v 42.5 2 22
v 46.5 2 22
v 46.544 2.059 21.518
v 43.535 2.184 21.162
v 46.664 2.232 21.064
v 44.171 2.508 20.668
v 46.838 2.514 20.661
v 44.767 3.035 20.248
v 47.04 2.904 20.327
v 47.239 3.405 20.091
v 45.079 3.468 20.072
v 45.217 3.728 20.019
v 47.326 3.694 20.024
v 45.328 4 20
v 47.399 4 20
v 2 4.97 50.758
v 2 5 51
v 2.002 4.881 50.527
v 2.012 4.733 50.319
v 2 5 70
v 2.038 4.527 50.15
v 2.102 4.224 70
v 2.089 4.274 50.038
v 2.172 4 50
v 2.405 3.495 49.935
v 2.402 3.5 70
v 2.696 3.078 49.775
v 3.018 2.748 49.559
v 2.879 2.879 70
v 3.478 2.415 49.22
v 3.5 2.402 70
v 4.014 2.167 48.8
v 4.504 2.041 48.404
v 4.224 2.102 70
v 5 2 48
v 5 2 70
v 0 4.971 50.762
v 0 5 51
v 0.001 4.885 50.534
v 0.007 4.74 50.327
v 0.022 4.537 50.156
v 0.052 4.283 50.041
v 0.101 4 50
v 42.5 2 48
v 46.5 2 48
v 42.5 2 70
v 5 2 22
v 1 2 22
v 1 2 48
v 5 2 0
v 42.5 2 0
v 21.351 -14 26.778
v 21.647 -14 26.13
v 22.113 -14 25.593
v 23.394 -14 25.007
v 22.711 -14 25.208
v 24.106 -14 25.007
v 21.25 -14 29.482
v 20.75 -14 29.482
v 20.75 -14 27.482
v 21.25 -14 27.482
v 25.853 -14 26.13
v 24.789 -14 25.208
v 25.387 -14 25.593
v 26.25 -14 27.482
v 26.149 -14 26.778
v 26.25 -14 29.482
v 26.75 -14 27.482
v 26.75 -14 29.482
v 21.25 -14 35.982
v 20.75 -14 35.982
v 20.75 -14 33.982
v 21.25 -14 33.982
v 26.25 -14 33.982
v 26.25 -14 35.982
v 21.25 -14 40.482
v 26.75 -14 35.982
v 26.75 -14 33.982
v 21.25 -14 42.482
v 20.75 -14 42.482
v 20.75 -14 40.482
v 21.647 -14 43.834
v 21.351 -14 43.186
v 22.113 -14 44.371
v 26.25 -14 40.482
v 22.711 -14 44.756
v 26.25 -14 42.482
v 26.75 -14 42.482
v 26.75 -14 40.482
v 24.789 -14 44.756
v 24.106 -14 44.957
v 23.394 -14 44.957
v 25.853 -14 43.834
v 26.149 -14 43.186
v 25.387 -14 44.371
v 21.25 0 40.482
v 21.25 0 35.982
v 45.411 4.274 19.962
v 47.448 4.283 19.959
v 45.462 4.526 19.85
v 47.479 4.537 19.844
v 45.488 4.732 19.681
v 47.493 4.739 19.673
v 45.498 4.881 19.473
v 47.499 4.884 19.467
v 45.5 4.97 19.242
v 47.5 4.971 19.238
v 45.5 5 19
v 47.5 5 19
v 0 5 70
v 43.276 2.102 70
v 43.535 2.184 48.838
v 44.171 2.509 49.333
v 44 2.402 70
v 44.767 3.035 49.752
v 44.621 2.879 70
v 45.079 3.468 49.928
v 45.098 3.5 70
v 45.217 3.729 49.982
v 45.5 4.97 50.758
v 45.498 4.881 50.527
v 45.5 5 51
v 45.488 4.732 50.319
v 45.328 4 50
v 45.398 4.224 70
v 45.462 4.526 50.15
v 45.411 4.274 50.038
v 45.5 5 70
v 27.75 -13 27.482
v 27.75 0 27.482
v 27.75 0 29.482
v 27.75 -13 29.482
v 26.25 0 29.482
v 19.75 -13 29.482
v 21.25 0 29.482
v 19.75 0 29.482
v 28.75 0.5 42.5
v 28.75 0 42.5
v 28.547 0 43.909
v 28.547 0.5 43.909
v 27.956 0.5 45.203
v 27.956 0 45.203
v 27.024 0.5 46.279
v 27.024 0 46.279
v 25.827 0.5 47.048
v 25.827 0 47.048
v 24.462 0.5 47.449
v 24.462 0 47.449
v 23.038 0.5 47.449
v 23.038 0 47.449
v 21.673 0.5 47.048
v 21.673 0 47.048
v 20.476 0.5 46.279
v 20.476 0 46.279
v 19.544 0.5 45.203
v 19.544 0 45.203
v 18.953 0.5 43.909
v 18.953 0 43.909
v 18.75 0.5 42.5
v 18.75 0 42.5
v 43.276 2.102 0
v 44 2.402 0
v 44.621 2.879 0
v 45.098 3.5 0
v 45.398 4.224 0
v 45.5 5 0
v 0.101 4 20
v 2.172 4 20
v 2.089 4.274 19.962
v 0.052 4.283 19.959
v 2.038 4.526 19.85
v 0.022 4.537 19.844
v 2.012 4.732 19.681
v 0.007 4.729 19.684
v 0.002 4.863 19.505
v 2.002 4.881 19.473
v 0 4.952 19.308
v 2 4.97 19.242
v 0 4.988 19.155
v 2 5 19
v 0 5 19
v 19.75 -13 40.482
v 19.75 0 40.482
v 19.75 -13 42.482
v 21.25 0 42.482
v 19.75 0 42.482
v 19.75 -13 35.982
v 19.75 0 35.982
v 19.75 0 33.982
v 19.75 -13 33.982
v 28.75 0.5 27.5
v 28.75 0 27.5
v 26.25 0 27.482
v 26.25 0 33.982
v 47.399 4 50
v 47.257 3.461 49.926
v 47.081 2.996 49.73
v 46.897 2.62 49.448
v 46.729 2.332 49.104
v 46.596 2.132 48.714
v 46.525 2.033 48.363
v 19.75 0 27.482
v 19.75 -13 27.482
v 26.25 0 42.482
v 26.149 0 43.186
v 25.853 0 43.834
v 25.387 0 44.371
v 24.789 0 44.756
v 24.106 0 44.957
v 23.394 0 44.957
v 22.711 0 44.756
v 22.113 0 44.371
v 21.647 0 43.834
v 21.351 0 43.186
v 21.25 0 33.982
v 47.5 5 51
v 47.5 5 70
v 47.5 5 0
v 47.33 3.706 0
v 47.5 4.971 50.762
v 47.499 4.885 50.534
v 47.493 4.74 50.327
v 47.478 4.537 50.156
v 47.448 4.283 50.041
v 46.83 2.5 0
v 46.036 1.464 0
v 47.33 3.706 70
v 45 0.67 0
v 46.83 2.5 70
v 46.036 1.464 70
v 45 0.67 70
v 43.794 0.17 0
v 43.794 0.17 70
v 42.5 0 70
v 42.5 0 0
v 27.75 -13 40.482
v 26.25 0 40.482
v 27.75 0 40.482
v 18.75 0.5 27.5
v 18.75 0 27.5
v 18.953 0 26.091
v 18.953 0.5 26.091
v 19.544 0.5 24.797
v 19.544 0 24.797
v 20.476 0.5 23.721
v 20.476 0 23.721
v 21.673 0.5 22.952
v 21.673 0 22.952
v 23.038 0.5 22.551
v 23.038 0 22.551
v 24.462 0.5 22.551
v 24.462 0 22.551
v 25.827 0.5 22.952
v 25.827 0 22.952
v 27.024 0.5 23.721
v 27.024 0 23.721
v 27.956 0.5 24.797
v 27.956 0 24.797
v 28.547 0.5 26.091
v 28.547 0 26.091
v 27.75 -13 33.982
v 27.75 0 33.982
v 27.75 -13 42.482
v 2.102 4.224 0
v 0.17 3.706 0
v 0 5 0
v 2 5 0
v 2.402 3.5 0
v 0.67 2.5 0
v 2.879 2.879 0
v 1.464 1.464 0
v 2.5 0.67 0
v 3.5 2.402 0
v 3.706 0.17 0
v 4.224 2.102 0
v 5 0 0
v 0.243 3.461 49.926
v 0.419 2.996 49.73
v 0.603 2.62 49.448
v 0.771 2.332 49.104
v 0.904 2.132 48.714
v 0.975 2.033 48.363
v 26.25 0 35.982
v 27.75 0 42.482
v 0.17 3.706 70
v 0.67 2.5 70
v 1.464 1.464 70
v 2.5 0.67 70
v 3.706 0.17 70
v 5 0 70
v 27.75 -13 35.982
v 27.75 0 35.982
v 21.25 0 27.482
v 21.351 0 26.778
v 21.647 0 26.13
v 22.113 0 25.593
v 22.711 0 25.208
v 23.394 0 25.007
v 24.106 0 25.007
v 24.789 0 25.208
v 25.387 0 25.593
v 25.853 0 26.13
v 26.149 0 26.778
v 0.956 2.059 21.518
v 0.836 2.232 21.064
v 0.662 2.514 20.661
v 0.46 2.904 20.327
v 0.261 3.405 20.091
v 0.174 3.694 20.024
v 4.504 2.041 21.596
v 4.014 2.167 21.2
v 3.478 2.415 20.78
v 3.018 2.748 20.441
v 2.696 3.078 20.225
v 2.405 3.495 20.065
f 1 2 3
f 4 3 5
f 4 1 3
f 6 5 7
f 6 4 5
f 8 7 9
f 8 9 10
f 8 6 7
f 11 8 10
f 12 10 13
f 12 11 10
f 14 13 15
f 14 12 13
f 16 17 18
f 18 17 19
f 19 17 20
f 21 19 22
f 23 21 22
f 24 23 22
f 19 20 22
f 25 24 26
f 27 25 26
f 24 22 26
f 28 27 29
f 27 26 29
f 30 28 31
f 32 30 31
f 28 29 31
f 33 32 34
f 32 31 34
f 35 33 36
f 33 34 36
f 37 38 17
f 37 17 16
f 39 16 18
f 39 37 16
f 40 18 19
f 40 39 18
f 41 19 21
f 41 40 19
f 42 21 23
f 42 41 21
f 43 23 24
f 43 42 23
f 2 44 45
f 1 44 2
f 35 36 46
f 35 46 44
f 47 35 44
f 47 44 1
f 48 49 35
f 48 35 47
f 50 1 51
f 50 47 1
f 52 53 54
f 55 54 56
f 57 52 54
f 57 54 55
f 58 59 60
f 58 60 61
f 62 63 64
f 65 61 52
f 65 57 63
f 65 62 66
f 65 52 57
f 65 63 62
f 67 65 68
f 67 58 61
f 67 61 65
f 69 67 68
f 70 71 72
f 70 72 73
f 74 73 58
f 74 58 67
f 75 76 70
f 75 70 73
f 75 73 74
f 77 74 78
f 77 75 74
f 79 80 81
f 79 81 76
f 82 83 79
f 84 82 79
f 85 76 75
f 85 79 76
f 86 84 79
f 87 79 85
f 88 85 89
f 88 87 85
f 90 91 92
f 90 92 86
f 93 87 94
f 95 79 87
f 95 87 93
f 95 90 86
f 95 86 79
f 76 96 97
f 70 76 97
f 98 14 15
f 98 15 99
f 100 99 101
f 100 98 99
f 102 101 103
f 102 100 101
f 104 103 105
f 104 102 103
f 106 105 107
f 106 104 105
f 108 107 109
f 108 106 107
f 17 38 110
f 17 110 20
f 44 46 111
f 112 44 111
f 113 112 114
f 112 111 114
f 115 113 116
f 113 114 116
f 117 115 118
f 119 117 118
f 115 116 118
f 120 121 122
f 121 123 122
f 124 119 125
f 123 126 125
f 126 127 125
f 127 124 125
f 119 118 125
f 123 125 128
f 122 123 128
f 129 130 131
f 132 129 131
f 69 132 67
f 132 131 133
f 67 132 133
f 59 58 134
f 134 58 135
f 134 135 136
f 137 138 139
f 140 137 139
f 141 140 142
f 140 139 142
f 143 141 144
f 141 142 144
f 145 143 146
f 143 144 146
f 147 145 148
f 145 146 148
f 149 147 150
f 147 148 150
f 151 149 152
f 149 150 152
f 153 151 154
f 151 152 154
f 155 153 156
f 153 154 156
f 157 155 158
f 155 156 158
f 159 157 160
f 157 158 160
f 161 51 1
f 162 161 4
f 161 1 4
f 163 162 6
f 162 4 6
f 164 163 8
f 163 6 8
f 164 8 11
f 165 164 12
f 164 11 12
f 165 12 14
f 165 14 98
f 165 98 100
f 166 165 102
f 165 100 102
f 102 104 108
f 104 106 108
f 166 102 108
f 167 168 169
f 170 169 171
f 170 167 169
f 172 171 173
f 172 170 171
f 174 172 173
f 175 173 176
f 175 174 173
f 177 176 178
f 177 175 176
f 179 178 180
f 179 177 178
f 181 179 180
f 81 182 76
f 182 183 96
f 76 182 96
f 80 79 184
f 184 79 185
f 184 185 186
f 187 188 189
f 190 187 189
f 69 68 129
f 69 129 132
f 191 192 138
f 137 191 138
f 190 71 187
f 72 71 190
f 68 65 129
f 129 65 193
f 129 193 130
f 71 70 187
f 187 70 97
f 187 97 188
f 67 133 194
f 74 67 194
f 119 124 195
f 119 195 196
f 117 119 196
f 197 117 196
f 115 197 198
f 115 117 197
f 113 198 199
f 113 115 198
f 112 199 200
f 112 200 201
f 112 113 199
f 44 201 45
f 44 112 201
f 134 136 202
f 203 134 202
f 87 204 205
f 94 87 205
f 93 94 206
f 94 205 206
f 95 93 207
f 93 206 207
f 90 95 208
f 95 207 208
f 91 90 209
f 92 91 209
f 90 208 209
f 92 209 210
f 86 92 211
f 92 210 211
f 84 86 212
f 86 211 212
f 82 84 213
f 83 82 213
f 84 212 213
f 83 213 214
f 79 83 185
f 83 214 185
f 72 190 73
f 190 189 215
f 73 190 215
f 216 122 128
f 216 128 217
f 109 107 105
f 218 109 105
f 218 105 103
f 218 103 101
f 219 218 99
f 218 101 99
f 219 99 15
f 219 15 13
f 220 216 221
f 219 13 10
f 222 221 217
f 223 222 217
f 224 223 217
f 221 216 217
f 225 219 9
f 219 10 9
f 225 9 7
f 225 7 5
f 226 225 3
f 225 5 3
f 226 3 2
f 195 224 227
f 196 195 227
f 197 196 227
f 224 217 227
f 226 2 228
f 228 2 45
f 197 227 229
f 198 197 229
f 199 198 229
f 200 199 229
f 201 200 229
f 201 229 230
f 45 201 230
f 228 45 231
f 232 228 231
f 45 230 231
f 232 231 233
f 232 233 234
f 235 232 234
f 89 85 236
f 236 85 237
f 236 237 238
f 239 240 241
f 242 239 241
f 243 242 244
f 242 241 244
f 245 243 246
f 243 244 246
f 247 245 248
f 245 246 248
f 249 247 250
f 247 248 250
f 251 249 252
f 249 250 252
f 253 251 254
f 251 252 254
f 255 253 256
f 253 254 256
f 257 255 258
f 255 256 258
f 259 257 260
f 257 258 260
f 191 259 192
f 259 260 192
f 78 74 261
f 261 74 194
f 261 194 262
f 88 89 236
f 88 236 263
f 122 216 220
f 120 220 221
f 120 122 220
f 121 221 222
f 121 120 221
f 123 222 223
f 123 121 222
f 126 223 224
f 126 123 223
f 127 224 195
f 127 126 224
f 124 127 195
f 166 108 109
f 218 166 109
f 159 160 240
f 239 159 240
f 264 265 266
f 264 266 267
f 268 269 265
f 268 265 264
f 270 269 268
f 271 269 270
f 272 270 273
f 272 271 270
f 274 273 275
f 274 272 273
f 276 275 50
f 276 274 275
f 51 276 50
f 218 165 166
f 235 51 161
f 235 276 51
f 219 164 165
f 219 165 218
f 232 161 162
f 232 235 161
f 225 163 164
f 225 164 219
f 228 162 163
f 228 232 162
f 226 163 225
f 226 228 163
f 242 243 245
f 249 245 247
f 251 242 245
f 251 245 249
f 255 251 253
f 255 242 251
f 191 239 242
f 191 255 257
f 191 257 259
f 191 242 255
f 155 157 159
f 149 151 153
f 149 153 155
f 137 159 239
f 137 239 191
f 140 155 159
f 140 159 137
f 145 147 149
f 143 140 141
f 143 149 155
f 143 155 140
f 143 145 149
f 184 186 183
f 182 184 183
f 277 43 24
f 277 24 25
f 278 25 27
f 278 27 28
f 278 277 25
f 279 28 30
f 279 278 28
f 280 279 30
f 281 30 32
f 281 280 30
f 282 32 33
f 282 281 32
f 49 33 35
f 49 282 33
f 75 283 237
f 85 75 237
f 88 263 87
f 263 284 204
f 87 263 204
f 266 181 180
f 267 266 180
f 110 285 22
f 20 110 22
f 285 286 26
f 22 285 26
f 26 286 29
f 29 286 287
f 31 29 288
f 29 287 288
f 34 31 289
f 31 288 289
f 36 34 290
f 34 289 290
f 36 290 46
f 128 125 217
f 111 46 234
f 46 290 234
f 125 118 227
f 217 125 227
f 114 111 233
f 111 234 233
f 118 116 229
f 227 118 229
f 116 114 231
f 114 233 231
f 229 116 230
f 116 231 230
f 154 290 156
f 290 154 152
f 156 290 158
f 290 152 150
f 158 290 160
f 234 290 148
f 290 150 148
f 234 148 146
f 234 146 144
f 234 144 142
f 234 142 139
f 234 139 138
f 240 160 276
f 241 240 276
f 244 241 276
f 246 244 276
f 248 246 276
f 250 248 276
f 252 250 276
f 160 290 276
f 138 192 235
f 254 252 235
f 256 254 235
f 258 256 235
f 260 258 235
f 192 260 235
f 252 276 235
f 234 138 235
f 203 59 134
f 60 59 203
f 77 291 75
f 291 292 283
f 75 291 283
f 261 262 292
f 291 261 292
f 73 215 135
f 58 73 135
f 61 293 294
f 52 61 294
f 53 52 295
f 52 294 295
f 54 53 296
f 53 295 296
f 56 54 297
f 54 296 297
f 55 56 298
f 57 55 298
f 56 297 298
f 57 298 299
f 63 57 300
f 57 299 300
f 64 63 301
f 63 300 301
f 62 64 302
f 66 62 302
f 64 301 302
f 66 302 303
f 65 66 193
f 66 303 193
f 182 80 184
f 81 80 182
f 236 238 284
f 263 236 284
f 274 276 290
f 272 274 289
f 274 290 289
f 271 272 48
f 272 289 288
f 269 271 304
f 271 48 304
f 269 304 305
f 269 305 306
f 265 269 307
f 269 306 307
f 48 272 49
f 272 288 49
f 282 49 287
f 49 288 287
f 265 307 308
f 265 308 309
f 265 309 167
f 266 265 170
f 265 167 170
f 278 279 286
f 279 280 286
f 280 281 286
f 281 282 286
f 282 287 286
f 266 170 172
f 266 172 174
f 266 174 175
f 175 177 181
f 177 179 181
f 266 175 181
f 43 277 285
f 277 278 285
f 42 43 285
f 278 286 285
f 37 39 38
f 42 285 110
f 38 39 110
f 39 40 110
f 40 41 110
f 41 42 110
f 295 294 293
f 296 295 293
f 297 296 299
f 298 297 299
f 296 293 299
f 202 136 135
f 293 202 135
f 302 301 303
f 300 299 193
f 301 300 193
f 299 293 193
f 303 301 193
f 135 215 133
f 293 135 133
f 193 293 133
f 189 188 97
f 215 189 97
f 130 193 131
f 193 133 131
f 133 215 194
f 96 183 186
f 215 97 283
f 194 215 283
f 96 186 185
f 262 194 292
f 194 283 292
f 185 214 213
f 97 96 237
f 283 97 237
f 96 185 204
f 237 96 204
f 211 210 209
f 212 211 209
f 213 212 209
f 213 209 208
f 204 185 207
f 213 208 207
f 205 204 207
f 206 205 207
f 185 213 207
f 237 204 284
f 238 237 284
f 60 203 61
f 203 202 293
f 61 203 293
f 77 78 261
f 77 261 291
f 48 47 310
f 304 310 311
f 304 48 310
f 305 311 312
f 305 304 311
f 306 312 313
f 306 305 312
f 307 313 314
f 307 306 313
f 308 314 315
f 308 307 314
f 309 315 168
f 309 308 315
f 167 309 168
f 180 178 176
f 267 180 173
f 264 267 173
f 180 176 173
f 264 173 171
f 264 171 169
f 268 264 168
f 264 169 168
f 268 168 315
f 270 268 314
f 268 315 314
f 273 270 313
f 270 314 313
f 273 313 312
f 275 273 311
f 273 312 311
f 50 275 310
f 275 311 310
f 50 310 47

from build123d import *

# Parameters (mm, degrees)
SKETCH2_W           = 47.5
SKETCH2_H           = 70
BOSS_EXTRUDE1_DEPTH = 5
CUT_EXTRUDE2_DEPTH  = 48.5
CUT_EXTRUDE1_DEPTH  = 71
CUT_EXTRUDE3_DEPTH  = 0.5
BOSS_EXTRUDE2_DEPTH = 14
CHAMFER1_SIZE       = 1


with BuildPart() as part:
    # Sketch2 → Boss-Extrude1 (new body)
    with BuildSketch(Plane(origin=(0, 0, 0), x_dir=(1, 0, 0), z_dir=(0, 1, 0))):
        with Locations((23.75, -35)):
            Rectangle(SKETCH2_W, SKETCH2_H)
    extrude(amount=BOSS_EXTRUDE1_DEPTH)

    # Sketch4 → Cut-Extrude2 (cut, through all)
    with BuildSketch(Plane.ZY):
        with BuildLine():
            Line((19, 5), (51, 5))
            ThreePointArc((51, 5), (50.292893219, 4.707106781), (50, 4))
            ThreePointArc((50, 4), (49.414213562, 2.585786438), (48, 2))
            Line((48, 2), (22, 2))
            ThreePointArc((22, 2), (20.585786438, 2.585786438), (20, 4))
            ThreePointArc((20, 4), (19.707106781, 4.707106781), (19, 5))
        make_face()
    extrude(amount=-CUT_EXTRUDE2_DEPTH, mode=Mode.SUBTRACT)

    # Sketch3 → Cut-Extrude1 (cut, through all)
    with BuildSketch(Plane.XY.offset(70)):
        with BuildLine():
            Line((5, 2), (42.5, 2))
            ThreePointArc((42.5, 2), (44.621320344, 2.878679656), (45.5, 5))
            Line((45.5, 5), (2, 5))
            ThreePointArc((2, 5), (2.878679656, 2.878679656), (5, 2))
        make_face()
        with BuildLine():
            Line((42.5, 0), (47.5, 0))
            Line((47.5, 0), (47.5, 5))
            ThreePointArc((47.5, 5), (46.035533906, 1.464466094), (42.5, 0))
        make_face()
        with BuildLine():
            Line((0, 5), (0, 0))
            Line((0, 0), (5, 0))
            ThreePointArc((5, 0), (1.464466094, 1.464466094), (0, 5))
        make_face()
    extrude(amount=-CUT_EXTRUDE1_DEPTH, mode=Mode.SUBTRACT)

    # Sketch6 → Cut-Extrude3 (cut)
    with BuildSketch(Plane.XZ):
        with BuildLine():
            Line((28.75, 35), (28.75, 42.5))
            ThreePointArc((28.75, 42.5), (23.75, 47.5), (18.75, 42.5))
            Line((18.75, 42.5), (18.75, 27.5))
            ThreePointArc((18.75, 27.5), (23.75, 22.5), (28.75, 27.5))
            Line((28.75, 27.5), (28.75, 35))
        make_face()
    extrude(amount=-CUT_EXTRUDE3_DEPTH, mode=Mode.SUBTRACT)


with BuildPart() as body_2:
    # Sketch5 → Boss-Extrude2 (new body)
    with BuildSketch(Plane.XZ):
        with BuildLine():
            Line((21.25, 40.482011201), (21.25, 35.982011201))
            Line((21.25, 35.982011201), (19.75, 35.982011201))
            Line((19.75, 35.982011201), (19.75, 33.982011201))
            Line((19.75, 33.982011201), (21.25, 33.982011201))
            Line((21.25, 33.982011201), (21.25, 29.482011201))
            Line((21.25, 29.482011201), (19.75, 29.482011201))
            Line((19.75, 29.482011201), (19.75, 27.482011201))
            Line((19.75, 27.482011201), (21.25, 27.482011201))
            ThreePointArc((21.25, 27.482011201), (23.75, 24.982011201), (26.25, 27.482011201))
            Line((26.25, 27.482011201), (27.75, 27.482011201))
            Line((27.75, 27.482011201), (27.75, 29.482011201))
            Line((27.75, 29.482011201), (26.25, 29.482011201))
            Line((26.25, 29.482011201), (26.25, 33.982011201))
            Line((26.25, 33.982011201), (27.75, 33.982011201))
            Line((27.75, 33.982011201), (27.75, 35.982011201))
            Line((27.75, 35.982011201), (26.25, 35.982011201))
            Line((26.25, 35.982011201), (26.25, 40.482011201))
            Line((26.25, 40.482011201), (27.75, 40.482011201))
            Line((27.75, 40.482011201), (27.75, 42.482011201))
            Line((27.75, 42.482011201), (26.25, 42.482011201))
            ThreePointArc((26.25, 42.482011201), (23.75, 44.982011201), (21.25, 42.482011201))
            Line((21.25, 42.482011201), (19.75, 42.482011201))
            Line((19.75, 42.482011201), (19.75, 40.482011201))
            Line((19.75, 40.482011201), (21.25, 40.482011201))
        make_face()
    extrude(amount=BOSS_EXTRUDE2_DEPTH)

    # Chamfer1
    chamfer1_edges = [body_2.edges().sort_by_distance(p)[0] for p in [
        (19.75, -14, 34.982011201),
        (19.75, -14, 28.482011201),
        (27.75, -14, 28.482011201),
        (27.75, -14, 34.982011201),
        (27.75, -14, 41.482011201),
        (19.75, -14, 41.482011201),
    ]]
    chamfer(chamfer1_edges, length=CHAMFER1_SIZE)


solid = Compound([part.part, body_2.part])
